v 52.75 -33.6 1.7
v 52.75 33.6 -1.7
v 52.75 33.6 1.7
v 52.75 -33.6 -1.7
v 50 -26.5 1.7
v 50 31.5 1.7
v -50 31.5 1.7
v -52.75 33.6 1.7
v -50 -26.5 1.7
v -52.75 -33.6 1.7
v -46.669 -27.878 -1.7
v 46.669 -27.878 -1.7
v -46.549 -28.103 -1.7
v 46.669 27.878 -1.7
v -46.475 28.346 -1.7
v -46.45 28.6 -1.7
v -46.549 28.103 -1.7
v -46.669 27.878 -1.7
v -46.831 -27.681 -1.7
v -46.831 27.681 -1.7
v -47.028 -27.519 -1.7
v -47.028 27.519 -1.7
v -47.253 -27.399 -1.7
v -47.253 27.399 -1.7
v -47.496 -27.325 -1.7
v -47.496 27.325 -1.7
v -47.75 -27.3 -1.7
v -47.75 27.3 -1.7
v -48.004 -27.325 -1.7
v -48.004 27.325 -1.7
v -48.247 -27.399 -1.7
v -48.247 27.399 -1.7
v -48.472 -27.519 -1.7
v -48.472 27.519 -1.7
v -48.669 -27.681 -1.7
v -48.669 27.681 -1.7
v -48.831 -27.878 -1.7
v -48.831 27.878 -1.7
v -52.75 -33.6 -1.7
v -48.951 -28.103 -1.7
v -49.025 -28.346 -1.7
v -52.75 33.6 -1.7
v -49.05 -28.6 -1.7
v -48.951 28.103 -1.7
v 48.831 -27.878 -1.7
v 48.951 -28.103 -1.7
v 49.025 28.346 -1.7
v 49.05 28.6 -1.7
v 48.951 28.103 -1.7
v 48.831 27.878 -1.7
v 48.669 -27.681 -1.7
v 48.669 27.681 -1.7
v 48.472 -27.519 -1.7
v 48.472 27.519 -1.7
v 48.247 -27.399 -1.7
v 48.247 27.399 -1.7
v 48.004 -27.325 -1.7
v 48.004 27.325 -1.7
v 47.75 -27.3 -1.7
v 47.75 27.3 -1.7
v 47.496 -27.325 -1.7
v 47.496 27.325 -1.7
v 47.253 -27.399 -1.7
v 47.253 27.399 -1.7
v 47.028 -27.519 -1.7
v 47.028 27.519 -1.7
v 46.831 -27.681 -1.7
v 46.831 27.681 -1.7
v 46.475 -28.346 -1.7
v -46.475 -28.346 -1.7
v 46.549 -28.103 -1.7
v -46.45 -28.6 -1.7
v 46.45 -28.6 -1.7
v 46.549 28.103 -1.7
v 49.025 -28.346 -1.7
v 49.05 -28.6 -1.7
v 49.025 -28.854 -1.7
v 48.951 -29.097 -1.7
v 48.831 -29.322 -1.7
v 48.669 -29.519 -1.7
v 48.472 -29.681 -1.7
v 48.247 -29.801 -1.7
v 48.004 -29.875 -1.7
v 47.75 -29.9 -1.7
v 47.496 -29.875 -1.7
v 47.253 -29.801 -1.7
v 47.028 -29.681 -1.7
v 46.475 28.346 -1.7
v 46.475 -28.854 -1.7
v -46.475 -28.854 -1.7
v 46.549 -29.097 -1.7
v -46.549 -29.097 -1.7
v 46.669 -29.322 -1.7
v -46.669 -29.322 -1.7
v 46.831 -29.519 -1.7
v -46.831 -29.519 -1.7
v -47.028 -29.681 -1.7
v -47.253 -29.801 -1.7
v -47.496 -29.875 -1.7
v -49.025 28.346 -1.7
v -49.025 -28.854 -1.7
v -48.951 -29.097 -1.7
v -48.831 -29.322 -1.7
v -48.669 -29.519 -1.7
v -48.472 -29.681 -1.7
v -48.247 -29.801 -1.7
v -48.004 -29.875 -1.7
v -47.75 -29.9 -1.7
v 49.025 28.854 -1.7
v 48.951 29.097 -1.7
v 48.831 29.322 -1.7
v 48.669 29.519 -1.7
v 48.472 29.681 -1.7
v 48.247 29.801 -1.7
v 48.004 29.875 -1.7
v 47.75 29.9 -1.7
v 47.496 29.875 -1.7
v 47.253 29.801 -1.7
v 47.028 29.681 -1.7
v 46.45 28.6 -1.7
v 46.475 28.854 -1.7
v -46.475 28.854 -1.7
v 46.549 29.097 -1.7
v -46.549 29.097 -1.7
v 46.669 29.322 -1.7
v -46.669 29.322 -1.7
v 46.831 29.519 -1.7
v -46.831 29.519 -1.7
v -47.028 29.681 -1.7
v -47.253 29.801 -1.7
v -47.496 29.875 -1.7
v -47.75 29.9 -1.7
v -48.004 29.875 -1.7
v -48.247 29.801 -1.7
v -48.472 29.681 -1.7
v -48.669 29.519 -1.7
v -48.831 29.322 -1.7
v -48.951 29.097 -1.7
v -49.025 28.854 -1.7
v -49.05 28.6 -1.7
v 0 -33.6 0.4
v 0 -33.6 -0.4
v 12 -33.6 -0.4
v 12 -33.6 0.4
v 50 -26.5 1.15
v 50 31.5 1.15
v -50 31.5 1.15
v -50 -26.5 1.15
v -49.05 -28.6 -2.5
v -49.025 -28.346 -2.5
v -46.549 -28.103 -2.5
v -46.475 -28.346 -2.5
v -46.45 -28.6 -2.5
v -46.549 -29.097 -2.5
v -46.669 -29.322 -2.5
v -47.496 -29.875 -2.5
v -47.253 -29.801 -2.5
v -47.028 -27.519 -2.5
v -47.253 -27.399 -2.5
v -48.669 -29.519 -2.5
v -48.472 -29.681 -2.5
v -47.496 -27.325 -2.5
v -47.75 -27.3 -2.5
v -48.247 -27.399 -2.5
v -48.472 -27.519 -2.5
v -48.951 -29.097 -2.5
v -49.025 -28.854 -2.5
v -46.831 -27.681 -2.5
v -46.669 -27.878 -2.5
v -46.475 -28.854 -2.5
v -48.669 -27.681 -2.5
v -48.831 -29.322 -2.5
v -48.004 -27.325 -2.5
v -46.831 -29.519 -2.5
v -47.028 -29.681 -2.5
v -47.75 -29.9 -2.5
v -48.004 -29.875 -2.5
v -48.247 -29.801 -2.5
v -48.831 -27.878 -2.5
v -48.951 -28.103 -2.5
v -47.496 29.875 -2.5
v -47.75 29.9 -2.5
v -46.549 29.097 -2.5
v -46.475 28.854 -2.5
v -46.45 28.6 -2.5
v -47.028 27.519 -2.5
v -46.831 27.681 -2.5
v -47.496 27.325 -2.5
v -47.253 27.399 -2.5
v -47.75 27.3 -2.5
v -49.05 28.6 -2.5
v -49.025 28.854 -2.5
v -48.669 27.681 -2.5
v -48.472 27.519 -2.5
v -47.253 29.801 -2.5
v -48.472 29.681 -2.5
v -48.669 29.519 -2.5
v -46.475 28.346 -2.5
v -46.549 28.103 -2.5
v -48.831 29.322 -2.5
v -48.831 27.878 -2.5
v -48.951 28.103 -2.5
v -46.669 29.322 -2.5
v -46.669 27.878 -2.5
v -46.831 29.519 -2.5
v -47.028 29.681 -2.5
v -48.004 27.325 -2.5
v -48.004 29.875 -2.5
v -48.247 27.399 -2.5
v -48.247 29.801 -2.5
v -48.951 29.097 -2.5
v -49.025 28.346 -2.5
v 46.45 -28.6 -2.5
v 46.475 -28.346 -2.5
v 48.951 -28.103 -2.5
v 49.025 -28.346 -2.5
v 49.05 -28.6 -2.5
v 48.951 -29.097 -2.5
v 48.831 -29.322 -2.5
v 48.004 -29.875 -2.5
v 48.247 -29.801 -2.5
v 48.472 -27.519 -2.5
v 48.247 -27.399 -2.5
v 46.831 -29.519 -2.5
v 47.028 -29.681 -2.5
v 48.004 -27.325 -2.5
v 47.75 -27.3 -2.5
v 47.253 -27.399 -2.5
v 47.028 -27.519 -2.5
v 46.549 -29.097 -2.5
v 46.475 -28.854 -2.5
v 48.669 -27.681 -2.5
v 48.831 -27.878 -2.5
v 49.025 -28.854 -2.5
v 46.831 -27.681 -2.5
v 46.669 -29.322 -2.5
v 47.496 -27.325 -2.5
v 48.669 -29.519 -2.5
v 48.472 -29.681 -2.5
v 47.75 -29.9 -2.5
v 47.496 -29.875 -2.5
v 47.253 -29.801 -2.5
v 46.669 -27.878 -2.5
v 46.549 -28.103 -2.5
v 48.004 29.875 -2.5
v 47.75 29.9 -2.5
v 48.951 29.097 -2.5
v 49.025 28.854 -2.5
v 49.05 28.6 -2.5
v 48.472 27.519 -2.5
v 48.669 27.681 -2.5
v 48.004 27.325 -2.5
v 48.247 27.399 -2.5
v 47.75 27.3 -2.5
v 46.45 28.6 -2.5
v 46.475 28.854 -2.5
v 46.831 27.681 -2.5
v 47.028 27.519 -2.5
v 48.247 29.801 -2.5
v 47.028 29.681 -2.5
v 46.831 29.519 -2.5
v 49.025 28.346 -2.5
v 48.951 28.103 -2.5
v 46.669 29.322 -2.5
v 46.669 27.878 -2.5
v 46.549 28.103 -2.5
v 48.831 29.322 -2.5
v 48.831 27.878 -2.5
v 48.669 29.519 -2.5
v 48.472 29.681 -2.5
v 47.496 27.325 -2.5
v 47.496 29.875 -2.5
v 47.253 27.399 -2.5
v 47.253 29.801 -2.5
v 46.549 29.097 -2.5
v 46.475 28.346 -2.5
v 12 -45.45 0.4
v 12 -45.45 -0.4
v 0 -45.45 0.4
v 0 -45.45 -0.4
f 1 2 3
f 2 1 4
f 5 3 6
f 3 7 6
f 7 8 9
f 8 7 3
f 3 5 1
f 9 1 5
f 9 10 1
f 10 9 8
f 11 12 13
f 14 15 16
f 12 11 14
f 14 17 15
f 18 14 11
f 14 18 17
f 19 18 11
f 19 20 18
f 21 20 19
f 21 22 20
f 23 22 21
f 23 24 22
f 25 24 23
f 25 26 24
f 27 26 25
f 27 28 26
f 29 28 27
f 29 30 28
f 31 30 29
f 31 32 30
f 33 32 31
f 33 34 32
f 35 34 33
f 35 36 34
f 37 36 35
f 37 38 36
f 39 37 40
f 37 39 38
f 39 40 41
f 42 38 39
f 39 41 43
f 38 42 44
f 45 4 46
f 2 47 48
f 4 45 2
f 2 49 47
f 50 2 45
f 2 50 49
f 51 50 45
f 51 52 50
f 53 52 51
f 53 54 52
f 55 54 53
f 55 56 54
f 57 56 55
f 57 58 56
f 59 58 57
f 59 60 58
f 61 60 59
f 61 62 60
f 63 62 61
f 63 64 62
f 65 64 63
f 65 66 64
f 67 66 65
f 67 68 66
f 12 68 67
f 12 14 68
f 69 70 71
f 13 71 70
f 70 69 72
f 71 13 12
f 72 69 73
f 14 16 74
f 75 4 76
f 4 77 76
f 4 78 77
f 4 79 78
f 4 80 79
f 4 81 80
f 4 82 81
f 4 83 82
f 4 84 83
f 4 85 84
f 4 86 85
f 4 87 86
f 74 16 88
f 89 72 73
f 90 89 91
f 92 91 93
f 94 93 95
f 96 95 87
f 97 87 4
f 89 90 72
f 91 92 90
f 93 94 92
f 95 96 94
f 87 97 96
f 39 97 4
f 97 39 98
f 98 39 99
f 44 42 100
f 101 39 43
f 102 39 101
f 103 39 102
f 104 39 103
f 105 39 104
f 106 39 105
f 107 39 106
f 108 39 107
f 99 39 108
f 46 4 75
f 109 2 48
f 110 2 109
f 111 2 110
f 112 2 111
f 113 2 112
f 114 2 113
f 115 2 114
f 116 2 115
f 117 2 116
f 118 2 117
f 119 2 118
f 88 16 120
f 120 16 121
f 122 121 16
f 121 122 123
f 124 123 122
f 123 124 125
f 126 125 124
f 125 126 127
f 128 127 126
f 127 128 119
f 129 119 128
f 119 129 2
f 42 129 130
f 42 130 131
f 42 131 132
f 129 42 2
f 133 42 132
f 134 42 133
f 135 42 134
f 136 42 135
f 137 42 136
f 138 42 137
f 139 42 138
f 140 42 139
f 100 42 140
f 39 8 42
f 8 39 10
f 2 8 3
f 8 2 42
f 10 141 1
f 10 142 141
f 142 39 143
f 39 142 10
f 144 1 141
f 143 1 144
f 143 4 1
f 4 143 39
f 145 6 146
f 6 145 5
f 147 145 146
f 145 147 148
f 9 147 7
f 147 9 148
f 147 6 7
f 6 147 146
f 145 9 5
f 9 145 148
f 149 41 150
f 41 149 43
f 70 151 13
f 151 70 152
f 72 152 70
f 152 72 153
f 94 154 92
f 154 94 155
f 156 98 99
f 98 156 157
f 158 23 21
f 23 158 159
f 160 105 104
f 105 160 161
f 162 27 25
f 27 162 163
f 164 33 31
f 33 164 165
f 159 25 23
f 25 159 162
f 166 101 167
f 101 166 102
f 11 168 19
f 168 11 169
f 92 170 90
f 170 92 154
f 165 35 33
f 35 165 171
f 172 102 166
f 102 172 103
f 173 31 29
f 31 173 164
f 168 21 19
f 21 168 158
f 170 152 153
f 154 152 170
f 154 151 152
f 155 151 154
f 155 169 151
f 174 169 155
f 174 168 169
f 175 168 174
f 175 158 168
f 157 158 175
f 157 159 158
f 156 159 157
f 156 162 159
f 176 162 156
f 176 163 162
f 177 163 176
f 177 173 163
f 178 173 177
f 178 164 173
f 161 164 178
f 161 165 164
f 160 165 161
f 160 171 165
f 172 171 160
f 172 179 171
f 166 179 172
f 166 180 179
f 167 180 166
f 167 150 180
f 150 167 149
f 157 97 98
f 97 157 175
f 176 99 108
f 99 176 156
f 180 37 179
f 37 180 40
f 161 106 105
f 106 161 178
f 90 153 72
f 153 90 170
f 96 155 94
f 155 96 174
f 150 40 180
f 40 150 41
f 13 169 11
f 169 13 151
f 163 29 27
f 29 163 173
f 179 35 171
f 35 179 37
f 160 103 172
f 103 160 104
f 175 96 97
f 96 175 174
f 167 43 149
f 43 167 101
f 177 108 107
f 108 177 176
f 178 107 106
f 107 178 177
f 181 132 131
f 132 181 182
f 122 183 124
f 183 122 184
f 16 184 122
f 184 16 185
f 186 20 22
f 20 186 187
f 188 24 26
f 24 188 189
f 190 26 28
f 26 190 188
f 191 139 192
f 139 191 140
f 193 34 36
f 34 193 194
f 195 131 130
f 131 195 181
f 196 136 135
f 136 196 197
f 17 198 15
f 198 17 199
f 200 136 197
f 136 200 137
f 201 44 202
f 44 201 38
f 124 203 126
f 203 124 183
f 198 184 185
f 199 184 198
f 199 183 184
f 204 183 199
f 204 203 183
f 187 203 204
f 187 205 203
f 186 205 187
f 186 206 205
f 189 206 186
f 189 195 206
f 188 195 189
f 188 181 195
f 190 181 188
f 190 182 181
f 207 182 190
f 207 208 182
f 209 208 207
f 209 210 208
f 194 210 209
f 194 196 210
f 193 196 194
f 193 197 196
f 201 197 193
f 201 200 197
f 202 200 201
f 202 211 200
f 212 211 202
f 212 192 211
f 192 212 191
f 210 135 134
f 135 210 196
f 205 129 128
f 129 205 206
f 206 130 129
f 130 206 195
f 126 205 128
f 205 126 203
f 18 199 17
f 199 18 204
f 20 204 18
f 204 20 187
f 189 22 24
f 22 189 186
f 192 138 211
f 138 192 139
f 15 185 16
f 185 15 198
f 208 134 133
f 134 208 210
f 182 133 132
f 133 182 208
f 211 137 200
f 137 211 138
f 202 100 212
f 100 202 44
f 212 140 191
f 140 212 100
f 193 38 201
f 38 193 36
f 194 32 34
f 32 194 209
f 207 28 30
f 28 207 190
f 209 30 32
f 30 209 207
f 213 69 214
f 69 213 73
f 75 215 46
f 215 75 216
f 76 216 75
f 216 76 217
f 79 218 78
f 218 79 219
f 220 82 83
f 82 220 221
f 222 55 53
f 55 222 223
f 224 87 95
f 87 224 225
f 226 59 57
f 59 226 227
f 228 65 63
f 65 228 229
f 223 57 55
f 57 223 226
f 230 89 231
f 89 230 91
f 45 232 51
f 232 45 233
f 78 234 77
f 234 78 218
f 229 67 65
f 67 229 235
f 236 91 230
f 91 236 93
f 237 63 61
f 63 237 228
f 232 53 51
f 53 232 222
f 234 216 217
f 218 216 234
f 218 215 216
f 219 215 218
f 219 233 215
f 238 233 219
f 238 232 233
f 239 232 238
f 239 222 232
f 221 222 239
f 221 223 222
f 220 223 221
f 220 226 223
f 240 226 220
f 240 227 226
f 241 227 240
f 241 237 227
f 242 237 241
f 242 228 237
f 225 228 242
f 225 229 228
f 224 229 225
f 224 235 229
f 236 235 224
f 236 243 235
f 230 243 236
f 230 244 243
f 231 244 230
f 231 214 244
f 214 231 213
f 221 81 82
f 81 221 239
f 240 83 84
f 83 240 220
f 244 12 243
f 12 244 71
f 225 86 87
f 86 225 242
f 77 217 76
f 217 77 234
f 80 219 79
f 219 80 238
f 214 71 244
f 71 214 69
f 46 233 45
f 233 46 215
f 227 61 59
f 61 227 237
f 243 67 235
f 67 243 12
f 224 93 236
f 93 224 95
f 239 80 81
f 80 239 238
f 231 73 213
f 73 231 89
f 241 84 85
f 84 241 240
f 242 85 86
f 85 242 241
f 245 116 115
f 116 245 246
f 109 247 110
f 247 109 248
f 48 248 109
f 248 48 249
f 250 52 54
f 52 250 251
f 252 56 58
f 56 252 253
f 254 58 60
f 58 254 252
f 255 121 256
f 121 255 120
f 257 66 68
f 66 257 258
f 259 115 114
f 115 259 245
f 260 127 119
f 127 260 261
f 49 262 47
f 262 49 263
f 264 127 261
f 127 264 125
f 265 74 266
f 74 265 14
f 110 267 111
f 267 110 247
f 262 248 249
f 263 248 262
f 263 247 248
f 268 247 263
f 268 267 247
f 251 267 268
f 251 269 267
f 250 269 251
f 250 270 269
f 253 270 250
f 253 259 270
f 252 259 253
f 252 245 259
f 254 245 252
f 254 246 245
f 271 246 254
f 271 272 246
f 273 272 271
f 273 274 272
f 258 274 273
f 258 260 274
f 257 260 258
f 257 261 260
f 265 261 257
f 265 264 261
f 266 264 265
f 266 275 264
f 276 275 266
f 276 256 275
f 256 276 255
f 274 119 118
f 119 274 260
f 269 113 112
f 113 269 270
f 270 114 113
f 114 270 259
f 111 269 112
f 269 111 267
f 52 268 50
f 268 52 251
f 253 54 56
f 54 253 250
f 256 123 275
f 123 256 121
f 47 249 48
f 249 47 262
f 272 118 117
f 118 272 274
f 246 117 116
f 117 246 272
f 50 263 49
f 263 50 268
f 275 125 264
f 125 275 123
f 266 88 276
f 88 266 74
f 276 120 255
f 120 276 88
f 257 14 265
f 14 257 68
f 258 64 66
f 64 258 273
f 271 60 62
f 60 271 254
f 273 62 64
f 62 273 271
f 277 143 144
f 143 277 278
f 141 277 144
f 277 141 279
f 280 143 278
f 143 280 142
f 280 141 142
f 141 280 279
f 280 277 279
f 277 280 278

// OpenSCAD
// LCD display 4.3" — 105.5 x 67.2 x 3.4
// One connected solid (union), no floating parts.

// --- Primary dimensions (match request) ---
overall_width_mm     = 105.5;
overall_height_mm    = 67.2;
overall_thickness_mm = 3.4;

// Front aperture (window recess) from spec points
aperture_min_x_mm = -50;
aperture_min_y_mm = -26.5;
aperture_max_x_mm =  50;
aperture_max_y_mm =  31.5;
aperture_depth_mm = 0.5;

// FFC tail placement points: [[0, -34.5], [12, -31.5]]
ffc_x0 = 0;
ffc_y0 = -34.5;
ffc_x1 = 12;
ffc_y1 = -31.5;

// Tail geometry (kept modest; must be connected)
tail_thickness_mm = 0.8;
tail_len_mm       = 12;

// Back-side bosses (keep single connected solid)
mounting_hole_diameter_mm   = 2.6;
mounting_hole_edge_margin_mm = 5;
boss_h_mm        = 0.8;
boss_overlap_mm  = 0.25;

eps_mm     = 0.05;
overlap_mm = 0.3;

module lcd_display_solid() {
  union() {
    // Base body with front aperture recess (difference yields one solid)
    difference() {
      cube([overall_width_mm, overall_height_mm, overall_thickness_mm], center=true);

      // Aperture recess from the front face (+Z)
      translate([
        (aperture_min_x_mm + aperture_max_x_mm)/2,
        (aperture_min_y_mm + aperture_max_y_mm)/2,
        overall_thickness_mm/2 - (aperture_depth_mm + eps_mm)/2
      ])
        cube([
          (aperture_max_x_mm - aperture_min_x_mm),
          (aperture_max_y_mm - aperture_min_y_mm),
          aperture_depth_mm + eps_mm
        ], center=true);
    }

    // FFC tail: use given XY points for width and center; attach to bottom edge (negative Y)
    tail_w = abs(ffc_x1 - ffc_x0);

    // Ensure non-zero width
    tail_w_eff = max(tail_w, 0.1);

    // Attach so tail overlaps into body by overlap_mm at y = -overall_height/2
    translate([
      (ffc_x0 + ffc_x1)/2,
      -overall_height_mm/2 - tail_len_mm/2 + overlap_mm/2,
      0  // centered in thickness so it is visible in side/top views
    ])
      cube([tail_w_eff, tail_len_mm, tail_thickness_mm], center=true);

    // Back-side bosses at 4 corners (connected via overlap)
    for (x_mult = [-1, 1], y_mult = [-1, 1]) {
      translate([
        x_mult * (overall_width_mm/2 - mounting_hole_edge_margin_mm),
        y_mult * (overall_height_mm/2 - mounting_hole_edge_margin_mm),
        -overall_thickness_mm/2 - boss_h_mm/2 + boss_overlap_mm/2
      ])
        cylinder(
          r = mounting_hole_diameter_mm/2,
          h = boss_h_mm + boss_overlap_mm,
          center = true,
          $fn = 32
        );
    }
  }
}

// --- Assembly (single connected solid) ---
lcd_display_solid();
